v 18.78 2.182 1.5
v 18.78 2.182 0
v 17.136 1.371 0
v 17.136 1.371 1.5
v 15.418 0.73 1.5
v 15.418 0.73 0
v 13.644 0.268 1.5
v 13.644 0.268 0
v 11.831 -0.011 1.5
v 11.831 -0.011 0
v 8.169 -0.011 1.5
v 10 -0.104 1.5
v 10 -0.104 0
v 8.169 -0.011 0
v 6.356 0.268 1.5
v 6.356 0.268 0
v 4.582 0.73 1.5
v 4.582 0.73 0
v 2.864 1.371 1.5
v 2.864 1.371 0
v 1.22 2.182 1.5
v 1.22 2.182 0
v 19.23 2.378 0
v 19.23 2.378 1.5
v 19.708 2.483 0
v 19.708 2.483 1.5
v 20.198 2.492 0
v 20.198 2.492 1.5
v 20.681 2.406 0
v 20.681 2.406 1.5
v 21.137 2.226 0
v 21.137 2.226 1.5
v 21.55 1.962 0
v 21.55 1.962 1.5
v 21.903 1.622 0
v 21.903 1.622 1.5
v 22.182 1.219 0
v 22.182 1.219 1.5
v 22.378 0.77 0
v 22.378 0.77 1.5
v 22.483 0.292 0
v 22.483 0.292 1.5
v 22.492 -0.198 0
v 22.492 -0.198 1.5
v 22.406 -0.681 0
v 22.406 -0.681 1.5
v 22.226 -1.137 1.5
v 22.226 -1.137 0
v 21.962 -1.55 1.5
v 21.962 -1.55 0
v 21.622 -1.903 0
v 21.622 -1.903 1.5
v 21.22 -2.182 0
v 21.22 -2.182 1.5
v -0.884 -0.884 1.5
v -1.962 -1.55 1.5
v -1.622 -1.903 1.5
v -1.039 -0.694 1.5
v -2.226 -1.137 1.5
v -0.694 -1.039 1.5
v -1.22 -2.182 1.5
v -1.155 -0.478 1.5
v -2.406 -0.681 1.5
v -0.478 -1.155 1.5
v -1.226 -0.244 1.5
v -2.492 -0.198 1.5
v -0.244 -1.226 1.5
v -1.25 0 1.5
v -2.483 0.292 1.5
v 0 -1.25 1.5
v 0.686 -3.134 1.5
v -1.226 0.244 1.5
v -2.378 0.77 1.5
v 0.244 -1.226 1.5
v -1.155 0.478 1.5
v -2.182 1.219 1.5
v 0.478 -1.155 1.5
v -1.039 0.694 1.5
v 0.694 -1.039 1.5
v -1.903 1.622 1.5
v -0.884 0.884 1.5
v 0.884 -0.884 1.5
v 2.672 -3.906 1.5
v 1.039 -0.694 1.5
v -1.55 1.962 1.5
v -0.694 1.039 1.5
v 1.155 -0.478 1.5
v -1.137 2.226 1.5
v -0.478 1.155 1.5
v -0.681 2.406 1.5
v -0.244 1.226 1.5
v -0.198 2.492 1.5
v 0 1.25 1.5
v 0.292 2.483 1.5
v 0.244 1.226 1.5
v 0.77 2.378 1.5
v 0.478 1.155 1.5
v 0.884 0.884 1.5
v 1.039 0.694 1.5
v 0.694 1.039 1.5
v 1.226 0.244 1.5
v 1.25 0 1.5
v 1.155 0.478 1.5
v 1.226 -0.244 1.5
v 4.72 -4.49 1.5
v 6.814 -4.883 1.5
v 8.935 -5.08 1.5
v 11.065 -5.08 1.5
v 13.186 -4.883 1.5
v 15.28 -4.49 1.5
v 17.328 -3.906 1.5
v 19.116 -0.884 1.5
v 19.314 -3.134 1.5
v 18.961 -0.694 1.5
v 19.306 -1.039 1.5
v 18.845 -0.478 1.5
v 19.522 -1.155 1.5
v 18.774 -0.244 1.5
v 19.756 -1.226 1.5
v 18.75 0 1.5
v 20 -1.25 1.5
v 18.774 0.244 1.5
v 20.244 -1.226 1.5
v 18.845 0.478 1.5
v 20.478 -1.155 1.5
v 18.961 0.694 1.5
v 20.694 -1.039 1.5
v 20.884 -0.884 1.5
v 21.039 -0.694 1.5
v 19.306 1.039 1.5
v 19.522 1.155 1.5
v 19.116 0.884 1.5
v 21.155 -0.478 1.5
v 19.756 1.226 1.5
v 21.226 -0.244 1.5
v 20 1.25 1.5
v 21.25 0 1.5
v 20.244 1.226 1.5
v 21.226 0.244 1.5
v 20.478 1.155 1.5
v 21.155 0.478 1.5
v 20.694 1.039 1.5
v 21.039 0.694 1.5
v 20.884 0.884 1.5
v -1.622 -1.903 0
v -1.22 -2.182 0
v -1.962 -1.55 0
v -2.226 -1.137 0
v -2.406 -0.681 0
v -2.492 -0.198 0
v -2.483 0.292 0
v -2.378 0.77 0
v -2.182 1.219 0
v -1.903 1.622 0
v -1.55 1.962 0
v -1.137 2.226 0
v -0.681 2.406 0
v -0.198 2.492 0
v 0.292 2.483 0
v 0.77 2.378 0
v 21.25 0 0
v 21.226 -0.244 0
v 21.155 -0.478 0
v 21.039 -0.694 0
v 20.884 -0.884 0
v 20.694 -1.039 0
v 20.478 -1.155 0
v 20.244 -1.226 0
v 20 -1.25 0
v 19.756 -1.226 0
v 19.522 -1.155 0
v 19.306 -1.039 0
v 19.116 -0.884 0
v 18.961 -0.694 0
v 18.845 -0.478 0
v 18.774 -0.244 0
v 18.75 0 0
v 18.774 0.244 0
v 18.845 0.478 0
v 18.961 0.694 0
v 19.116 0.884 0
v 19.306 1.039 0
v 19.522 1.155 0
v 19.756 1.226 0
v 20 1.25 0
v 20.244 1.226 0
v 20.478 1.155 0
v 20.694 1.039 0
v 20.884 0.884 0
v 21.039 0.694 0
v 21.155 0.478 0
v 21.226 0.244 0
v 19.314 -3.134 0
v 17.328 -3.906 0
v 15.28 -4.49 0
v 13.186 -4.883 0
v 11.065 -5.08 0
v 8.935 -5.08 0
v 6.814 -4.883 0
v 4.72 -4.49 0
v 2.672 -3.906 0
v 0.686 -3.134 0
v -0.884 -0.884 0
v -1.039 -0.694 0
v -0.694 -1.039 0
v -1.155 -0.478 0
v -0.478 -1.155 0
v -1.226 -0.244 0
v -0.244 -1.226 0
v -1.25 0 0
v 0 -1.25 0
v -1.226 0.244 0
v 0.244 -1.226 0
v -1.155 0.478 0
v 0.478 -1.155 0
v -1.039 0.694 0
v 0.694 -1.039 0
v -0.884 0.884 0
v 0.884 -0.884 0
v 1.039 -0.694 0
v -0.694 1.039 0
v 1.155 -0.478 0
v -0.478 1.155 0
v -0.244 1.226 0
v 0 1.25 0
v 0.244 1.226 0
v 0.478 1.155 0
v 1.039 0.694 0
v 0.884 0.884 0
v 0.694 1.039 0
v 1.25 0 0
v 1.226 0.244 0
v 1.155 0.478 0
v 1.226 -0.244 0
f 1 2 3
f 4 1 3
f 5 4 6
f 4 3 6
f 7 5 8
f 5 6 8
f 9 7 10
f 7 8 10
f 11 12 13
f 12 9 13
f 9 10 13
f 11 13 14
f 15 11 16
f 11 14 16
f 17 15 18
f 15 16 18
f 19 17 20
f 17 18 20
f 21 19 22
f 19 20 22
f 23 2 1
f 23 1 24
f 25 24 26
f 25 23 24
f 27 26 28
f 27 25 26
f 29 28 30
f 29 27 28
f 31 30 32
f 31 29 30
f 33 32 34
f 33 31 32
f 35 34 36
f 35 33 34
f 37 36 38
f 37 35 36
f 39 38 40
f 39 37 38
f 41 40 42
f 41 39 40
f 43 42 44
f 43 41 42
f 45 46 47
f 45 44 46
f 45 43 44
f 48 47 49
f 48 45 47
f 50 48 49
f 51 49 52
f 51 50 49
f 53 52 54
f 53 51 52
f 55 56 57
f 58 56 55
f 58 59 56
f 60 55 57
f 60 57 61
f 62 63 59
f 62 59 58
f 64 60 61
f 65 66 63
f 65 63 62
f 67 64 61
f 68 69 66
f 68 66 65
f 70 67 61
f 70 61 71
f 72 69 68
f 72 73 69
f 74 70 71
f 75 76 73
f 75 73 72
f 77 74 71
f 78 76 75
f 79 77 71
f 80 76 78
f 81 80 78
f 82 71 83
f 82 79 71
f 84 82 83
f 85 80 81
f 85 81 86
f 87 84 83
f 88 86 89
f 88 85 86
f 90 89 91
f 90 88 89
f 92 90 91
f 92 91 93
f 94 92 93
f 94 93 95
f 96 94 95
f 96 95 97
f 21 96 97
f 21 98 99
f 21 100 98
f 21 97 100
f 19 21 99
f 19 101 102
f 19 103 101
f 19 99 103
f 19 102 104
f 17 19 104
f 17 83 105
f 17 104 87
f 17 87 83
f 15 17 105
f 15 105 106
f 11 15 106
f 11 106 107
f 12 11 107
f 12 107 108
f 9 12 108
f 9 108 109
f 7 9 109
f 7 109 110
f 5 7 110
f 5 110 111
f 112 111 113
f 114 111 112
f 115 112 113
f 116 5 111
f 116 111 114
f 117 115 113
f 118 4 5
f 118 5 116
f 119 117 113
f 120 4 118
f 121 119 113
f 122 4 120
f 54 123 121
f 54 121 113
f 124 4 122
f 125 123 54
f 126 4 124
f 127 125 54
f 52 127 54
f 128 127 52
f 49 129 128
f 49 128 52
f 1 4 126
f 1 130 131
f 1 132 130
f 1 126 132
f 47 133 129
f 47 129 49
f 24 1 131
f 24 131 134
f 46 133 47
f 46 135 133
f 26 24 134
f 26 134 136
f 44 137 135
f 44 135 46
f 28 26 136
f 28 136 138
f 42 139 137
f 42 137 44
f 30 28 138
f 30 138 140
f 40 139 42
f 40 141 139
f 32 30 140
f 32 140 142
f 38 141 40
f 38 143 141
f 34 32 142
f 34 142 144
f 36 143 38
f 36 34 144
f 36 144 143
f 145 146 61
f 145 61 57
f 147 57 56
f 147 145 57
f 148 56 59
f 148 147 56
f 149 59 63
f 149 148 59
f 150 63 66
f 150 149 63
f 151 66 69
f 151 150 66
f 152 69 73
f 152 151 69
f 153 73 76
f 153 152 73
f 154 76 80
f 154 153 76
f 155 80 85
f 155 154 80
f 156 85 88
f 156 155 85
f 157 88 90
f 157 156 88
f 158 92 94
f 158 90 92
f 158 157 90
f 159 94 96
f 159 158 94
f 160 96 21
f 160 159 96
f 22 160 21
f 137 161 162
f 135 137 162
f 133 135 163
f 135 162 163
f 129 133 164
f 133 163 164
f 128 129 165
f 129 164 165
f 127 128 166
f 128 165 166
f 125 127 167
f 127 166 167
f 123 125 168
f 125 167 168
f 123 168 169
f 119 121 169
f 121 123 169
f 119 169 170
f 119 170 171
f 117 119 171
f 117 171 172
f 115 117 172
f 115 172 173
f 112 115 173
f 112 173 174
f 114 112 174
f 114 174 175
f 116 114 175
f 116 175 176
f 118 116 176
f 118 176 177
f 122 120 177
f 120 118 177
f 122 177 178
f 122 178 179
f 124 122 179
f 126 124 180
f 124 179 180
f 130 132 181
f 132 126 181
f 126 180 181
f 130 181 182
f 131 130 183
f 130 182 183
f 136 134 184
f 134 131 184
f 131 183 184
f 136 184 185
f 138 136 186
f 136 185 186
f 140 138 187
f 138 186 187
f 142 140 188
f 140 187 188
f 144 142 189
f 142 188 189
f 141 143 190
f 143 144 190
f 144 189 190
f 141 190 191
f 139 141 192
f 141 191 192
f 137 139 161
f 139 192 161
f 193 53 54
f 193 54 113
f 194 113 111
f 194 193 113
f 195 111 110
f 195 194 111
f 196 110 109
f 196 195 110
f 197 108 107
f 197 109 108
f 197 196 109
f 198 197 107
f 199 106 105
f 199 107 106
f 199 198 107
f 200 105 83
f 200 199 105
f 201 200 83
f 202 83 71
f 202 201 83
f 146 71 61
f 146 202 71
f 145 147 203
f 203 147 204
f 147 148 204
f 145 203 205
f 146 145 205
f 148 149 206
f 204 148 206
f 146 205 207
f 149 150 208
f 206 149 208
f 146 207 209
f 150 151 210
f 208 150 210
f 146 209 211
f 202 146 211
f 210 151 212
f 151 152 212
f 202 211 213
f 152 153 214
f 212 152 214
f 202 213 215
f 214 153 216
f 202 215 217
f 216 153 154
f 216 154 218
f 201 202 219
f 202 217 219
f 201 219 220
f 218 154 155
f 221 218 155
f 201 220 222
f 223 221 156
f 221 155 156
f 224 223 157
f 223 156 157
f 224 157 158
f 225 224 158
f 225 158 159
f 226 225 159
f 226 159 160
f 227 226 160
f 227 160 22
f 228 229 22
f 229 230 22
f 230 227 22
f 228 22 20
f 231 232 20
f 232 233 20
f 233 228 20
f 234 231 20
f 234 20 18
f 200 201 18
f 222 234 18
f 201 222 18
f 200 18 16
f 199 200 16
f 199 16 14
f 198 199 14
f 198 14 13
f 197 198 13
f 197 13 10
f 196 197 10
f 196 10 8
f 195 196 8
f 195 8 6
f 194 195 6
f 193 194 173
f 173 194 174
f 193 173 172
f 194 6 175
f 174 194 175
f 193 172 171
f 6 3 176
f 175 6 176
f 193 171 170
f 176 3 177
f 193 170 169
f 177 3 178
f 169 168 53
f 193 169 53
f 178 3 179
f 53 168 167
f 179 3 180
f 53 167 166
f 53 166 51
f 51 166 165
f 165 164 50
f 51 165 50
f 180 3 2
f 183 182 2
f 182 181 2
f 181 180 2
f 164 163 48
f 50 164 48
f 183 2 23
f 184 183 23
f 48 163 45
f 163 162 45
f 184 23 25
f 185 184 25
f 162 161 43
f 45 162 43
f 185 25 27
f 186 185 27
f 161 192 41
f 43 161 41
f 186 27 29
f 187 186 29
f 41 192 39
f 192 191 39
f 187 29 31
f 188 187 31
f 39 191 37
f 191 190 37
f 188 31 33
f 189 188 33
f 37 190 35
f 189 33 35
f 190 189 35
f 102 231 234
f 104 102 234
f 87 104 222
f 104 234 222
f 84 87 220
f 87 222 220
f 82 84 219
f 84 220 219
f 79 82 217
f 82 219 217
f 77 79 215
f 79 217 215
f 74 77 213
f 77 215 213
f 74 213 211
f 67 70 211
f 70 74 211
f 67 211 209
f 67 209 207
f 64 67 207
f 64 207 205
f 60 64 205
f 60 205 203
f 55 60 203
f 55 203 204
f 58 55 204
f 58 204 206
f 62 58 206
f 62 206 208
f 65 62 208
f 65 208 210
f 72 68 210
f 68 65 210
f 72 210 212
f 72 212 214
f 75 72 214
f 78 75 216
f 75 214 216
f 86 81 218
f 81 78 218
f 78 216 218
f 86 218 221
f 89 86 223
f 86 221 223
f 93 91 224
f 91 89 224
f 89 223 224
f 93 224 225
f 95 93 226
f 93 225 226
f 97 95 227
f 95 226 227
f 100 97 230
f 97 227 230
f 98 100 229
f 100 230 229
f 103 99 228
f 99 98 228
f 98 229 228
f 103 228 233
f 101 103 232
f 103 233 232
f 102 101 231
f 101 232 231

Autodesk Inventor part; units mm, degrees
ref_plane "YZ Plane" through (0, 0, 0) normal (1, 0, 0) x (0, 1, 0)
ref_plane "XZ Plane" through (0, 0, 0) normal (0, 1, 0) x (-1, 0, 0)
ref_plane "XY Plane" through (0, 0, 0) normal (0, 0, 1) x (1, 0, 0)
sketch "Sketch1" plane through (0, 0, 0) normal (0, 0, 1) x (1, 0, 0)
  circle A0 centre (0, 0) radius 1.25
  line L0 (0, 0) -> (20, 0) construction
  circle A1 centre (20, 0) radius 1.25
  arc A2 (1.2195, 2.1824) -> (-1.2195, -2.1824) centre (0, 0) ccw
  arc A3 (21.2195, -2.1824) -> (18.7805, 2.1824) centre (20, 0) ccw
  arc A4 (1.2195, 2.1824) -> (18.7805, 2.1824) centre (10, 17.8955) ccw
  arc A5 (-1.2195, -2.1824) -> (21.2195, -2.1824) centre (10, 17.8955) ccw
  dimension "d0" = 2.5
  dimension "d1" = 20
  dimension "d8" = 5
  dimension "d17" = 18
extrude "Extrusion1" add sketch "Sketch1" along normal blind 1.5
properties part number "linkageA_mini"
